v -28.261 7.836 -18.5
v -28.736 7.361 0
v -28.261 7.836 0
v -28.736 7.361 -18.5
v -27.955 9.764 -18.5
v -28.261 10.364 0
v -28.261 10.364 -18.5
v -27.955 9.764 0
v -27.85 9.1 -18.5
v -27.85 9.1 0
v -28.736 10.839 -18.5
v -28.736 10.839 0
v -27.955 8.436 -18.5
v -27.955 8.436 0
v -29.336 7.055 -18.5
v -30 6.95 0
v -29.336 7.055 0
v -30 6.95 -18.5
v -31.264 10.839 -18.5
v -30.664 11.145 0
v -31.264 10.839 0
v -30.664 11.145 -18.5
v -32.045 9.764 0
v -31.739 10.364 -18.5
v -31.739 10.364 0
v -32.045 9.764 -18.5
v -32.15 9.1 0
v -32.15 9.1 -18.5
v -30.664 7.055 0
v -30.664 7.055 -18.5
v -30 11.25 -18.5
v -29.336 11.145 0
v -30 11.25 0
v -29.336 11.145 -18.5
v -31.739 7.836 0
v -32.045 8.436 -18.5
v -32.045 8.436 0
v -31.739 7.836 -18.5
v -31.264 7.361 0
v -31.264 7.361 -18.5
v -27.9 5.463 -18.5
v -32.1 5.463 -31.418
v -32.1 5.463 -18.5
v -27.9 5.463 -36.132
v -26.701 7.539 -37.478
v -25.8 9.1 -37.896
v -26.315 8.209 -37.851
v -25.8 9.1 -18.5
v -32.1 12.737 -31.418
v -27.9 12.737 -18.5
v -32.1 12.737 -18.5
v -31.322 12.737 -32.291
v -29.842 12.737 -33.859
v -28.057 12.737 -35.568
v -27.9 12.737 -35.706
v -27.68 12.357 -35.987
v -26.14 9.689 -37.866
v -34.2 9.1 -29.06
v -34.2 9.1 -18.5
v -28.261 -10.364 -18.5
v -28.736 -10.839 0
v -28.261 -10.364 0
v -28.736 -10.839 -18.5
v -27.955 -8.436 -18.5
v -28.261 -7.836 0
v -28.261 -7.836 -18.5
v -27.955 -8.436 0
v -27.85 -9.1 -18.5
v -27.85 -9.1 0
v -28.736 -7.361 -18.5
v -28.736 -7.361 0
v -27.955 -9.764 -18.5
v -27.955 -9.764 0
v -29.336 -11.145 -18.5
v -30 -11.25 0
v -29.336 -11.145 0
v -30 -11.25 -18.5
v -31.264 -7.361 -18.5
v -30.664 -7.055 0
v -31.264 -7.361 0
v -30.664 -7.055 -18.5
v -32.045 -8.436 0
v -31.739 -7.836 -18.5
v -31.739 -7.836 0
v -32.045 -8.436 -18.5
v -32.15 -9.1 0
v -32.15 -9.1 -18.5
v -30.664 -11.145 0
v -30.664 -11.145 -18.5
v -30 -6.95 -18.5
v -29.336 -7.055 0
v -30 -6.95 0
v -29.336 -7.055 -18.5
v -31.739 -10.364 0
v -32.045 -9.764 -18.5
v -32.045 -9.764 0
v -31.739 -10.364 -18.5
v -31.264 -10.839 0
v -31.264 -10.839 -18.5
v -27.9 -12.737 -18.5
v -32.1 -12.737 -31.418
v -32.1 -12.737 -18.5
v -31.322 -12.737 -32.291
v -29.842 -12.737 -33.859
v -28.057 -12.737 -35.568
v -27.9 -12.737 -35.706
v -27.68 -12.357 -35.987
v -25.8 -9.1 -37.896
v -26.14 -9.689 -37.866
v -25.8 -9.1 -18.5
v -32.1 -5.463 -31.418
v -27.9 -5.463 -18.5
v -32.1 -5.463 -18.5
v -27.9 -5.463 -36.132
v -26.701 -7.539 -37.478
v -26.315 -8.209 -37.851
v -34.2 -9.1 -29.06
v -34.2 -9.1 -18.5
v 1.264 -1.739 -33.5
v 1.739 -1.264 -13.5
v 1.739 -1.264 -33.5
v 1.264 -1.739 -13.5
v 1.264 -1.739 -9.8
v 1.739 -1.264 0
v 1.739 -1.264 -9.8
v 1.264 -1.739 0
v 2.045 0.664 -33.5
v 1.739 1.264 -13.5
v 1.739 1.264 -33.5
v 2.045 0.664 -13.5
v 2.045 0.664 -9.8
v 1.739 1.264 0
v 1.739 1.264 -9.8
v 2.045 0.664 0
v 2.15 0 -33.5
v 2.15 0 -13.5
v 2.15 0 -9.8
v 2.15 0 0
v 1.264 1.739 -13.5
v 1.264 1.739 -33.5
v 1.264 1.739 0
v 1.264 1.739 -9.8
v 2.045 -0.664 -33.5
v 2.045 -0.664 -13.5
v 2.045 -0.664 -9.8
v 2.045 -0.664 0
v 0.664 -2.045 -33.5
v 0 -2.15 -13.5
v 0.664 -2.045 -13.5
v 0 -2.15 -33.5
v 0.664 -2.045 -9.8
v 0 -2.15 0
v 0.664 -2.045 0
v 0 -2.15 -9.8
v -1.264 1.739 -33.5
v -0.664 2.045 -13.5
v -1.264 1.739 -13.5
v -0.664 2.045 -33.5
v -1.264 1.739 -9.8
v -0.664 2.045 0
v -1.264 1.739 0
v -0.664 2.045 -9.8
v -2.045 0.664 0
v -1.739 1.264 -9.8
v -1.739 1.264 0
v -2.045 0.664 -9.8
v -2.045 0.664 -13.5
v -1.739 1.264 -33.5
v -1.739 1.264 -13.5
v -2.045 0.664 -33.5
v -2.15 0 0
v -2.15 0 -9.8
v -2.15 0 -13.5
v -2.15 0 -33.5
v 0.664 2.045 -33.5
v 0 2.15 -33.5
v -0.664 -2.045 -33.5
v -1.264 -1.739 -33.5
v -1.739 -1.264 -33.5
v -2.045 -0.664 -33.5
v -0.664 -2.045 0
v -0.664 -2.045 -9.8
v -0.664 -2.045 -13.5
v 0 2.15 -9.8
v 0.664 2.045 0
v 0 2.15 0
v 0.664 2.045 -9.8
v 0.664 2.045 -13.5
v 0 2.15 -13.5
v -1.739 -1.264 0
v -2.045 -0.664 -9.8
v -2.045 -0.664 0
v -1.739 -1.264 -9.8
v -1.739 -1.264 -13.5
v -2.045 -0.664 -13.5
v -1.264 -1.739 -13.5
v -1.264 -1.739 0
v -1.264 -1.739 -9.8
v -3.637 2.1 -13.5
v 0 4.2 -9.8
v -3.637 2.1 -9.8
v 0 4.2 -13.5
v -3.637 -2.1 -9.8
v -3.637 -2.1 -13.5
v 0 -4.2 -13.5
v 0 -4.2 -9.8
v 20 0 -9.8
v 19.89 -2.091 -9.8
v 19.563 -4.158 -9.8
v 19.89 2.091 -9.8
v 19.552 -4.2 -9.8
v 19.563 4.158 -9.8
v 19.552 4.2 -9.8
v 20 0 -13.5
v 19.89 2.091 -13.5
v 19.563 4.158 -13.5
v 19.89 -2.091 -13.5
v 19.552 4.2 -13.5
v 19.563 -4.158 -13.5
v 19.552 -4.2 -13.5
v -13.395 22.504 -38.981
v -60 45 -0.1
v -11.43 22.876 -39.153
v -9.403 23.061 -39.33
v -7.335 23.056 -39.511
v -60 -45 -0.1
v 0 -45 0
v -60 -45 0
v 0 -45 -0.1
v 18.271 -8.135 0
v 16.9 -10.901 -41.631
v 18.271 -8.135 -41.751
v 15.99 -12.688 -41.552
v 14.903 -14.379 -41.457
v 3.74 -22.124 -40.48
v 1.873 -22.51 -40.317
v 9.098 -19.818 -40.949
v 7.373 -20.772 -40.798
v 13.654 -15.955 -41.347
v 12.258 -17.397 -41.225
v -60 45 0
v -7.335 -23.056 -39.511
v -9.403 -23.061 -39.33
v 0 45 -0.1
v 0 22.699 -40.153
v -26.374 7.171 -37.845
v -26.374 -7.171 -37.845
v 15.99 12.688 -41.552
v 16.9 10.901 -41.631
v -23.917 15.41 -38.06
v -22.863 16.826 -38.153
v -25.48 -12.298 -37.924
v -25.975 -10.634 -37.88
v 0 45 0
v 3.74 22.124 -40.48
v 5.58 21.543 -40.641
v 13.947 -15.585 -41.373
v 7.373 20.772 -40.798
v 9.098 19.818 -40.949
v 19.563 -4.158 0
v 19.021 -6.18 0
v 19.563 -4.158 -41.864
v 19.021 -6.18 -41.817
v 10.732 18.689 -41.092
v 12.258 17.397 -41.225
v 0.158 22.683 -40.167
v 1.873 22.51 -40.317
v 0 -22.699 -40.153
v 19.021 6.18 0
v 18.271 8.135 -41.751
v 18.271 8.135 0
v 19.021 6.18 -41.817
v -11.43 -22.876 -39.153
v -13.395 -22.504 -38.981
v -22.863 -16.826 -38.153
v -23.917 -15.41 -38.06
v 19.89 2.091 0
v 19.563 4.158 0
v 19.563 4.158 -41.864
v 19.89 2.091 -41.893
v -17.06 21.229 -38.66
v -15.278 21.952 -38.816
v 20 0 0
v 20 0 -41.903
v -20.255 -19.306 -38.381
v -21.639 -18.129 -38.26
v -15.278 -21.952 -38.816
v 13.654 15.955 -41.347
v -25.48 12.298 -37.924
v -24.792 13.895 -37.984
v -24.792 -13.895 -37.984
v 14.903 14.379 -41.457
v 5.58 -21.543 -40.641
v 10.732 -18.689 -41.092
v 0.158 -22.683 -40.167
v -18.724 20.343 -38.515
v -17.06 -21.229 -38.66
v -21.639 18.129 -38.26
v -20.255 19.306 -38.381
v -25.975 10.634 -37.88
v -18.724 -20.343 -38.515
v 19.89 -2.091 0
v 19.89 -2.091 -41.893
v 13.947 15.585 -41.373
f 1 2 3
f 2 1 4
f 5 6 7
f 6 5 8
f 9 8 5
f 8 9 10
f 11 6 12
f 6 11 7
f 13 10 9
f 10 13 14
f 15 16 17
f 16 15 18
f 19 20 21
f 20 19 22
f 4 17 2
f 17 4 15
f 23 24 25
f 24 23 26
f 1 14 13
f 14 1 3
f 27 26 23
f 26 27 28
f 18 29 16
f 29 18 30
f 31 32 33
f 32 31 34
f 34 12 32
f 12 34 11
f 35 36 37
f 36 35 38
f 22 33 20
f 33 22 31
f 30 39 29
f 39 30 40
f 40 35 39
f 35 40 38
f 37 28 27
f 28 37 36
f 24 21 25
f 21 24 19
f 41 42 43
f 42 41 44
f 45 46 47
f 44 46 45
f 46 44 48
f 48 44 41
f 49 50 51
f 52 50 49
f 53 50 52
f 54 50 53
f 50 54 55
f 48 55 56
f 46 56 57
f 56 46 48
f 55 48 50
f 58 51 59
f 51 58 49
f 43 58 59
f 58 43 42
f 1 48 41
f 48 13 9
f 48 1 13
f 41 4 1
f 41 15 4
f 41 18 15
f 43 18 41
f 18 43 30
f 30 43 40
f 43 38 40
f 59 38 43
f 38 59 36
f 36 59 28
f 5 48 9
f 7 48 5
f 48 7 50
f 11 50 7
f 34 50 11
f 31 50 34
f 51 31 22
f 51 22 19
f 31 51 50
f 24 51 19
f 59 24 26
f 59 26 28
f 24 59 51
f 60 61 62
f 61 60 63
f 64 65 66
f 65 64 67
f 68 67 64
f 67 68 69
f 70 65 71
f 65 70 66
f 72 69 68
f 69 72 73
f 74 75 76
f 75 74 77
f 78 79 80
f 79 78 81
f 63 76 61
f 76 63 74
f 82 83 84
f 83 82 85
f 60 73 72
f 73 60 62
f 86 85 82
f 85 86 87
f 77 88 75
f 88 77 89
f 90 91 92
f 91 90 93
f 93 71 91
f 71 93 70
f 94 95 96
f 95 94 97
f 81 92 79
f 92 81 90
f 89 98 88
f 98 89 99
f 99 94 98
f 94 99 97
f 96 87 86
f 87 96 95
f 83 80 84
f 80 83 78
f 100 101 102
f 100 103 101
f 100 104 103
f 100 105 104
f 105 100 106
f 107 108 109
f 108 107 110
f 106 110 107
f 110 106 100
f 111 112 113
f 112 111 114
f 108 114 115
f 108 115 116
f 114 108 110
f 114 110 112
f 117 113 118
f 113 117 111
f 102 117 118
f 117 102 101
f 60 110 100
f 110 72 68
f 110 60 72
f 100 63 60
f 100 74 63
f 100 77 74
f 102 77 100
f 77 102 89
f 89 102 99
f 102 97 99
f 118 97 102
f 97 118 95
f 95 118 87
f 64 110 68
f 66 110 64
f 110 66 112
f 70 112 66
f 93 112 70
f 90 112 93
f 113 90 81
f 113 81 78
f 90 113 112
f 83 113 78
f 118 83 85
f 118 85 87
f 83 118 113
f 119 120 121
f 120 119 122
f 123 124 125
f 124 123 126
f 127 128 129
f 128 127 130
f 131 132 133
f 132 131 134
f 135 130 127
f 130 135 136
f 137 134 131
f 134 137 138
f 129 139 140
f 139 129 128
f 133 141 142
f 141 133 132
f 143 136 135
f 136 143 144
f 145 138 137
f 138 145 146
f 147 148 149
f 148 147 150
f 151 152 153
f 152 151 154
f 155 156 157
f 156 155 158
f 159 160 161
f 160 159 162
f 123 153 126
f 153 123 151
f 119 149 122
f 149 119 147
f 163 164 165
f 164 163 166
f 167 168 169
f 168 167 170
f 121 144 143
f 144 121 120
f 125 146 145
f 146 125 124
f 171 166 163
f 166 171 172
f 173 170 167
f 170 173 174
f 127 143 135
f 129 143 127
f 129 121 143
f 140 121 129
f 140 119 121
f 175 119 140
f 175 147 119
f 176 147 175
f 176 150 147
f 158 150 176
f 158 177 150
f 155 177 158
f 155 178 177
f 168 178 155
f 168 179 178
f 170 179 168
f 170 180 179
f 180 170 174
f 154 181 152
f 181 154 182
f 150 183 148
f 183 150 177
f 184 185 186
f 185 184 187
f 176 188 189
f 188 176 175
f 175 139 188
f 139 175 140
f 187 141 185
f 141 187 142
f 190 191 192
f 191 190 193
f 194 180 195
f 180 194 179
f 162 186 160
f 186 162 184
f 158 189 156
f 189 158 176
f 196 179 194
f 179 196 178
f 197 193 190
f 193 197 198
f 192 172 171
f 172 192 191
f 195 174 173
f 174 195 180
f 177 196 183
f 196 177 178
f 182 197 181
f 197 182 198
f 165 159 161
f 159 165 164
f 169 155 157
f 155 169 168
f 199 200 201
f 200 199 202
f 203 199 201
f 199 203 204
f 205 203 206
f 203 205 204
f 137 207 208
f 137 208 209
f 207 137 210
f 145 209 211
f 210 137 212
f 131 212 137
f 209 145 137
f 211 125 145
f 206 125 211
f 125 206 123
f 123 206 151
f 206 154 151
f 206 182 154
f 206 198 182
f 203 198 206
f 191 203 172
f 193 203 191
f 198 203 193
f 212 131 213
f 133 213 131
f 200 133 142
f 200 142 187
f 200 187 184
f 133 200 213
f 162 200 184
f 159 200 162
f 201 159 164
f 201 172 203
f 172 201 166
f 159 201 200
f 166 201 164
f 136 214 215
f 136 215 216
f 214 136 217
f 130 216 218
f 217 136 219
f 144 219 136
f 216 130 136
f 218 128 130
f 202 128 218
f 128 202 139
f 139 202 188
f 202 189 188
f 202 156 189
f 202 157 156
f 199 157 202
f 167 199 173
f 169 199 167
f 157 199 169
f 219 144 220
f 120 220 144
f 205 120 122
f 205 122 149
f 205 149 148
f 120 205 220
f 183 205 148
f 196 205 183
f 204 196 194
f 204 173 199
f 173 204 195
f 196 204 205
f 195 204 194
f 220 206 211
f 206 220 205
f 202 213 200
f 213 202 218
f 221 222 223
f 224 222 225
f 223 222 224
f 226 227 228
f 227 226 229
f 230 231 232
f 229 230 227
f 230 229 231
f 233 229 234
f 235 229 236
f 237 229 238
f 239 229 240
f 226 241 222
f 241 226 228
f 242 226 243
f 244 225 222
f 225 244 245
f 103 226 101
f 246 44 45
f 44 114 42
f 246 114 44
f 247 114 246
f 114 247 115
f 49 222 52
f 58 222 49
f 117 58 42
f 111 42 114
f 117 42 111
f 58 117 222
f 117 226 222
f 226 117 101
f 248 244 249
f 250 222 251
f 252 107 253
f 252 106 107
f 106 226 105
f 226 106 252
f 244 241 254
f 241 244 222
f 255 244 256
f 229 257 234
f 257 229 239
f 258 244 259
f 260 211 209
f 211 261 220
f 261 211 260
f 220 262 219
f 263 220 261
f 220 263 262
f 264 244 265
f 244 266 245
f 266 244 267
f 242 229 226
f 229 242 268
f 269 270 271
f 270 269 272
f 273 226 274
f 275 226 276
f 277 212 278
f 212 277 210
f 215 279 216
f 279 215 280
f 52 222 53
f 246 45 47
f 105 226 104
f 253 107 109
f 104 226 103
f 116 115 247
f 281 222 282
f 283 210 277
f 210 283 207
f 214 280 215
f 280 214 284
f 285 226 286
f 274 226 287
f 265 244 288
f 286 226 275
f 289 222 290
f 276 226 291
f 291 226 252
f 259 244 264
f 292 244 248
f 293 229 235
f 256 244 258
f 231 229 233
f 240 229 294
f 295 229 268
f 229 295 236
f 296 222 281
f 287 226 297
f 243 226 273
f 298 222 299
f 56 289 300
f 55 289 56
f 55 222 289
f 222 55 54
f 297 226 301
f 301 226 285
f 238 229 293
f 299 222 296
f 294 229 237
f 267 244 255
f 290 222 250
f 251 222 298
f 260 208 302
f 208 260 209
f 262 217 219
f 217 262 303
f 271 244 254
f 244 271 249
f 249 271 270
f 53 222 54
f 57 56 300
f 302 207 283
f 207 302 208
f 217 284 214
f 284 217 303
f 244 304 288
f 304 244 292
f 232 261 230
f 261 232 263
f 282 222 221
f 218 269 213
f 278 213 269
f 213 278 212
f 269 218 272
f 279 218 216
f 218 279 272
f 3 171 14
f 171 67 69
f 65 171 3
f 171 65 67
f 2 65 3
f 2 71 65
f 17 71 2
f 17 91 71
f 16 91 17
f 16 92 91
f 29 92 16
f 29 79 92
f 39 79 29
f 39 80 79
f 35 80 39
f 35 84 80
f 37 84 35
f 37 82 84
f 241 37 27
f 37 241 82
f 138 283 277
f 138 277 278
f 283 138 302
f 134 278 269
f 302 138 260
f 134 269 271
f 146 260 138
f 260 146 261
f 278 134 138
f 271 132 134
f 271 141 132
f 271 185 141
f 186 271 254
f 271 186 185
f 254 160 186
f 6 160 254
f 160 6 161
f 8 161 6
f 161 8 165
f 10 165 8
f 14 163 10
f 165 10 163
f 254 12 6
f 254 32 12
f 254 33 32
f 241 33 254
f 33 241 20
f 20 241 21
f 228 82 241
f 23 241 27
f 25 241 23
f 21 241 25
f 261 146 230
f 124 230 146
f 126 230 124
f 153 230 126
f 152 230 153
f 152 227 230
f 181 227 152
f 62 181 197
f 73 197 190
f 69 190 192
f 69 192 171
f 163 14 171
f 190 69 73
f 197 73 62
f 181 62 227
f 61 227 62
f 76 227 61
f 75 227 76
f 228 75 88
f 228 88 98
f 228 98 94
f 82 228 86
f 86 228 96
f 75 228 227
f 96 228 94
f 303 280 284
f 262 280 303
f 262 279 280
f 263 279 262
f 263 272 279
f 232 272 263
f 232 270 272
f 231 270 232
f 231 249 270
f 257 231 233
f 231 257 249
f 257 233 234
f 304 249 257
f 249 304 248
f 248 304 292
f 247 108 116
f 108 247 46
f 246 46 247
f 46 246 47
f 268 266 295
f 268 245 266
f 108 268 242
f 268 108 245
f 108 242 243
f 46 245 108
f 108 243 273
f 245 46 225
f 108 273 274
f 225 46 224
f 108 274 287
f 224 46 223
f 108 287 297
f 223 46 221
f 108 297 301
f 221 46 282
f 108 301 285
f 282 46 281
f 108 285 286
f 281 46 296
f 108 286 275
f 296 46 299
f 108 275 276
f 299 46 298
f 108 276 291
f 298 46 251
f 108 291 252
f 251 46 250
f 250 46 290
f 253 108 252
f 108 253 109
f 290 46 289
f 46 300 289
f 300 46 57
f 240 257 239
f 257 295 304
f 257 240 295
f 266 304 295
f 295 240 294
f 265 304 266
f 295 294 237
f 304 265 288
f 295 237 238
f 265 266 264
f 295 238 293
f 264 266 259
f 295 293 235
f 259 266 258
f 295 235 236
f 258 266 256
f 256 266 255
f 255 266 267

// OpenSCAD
// file: 888_1000.scad
/*
// Nastavení zobrazení
$vpr = [338, 0, 357];
$vpt = [180, 25, -18];
$vpd = 1280;
*/
//improving rendering speed.
draft = true;   // sets rendering quality to draft.
$fs = draft ? 5 : 0.5;
$fa = 10;

/*
TODO: 

Přední díl obsahuje převis ve směru vybrání pro držák motoru. (U horního zámku)
Otvory pro šrouby v předním dílu jsou oválné, protože nejsou kolmo k rovině modelu.


*/




//vnitřní kapka
module hollowing_skeleton(shell_thickness = hull_wall_thickness, draft)
{

    beta = 90 - trailing_edge_angle(naca = hull_airfoil_thickness); // calculate the angle of trailing edge
    trailing_wall= 1/(cos(beta)); //calculate lenght of wall cut relative to wall thickness 

    intersection () {
    resize([hull_drop_length - shell_thickness - trailing_wall* shell_thickness, (hull_drop_length*hull_airfoil_thickness/100) - 2*shell_thickness, (hull_drop_length*hull_airfoil_thickness/100) - 2*shell_thickness], auto=true)
            rotate ([0,90,0])           
            rotate_extrude($fn = draft ? 50 : 100)
                rotate([0,0,90])
                    difference()
                    {
                      polygon(points = airfoil_data(naca=hull_airfoil_thickness, L = hull_drop_length, N=draft ? 50 : 200)); 
                      square(hull_drop_length); 
                    }
                    
      translate([0,0,hull_corner_radius])
        minkowski(){                   
            translate ([0,- hull_y_size , - hull_z_size/2 + shell_thickness])
                cube ([hull_x_size,2*hull_y_size - shell_thickness, hull_z_size - 2*shell_thickness - 2*hull_corner_radius]);
                rotate ([0,90,0])
                    cylinder (h = 1, r = hull_corner_radius, $fn = draft ? 50 : 100);                   
          }
                            
    }
}

module hollowing_skeleton_hem(ribbon_width, draft)
{

    beta = 90 - trailing_edge_angle(naca = hull_airfoil_thickness); // calculate the angle of trailing edge
    trailing_wall= 1/(cos(beta)); //calculate lenght of wall cut relative to wall thickness 

    intersection () {
    resize([hull_drop_length - ribbon_width - trailing_wall* ribbon_width, (hull_drop_length*hull_airfoil_thickness/100) - 2*ribbon_width, (hull_drop_length*hull_airfoil_thickness/100) - 2*ribbon_width], auto=true)
            rotate ([0,90,0])           
            rotate_extrude($fn = draft ? 50 : 100)
                rotate([0,0,90])
                    difference()
                    {
                      polygon(points = airfoil_data(naca=hull_airfoil_thickness, L = hull_drop_length, N=draft ? 50 : 200)); 
                      square(hull_drop_length); 
                    }
                    
      translate([0,0,hull_corner_radius])
        minkowski(){                   
            translate ([0,- hull_y_size, - hull_z_size/2 + ribbon_width])
                cube ([hull_x_size,2*hull_y_size - ribbon_width, hull_z_size - 2*ribbon_width - 2*hull_corner_radius]);
                rotate ([0,90,0])
                    cylinder (h = 1, r = hull_corner_radius, $fn = draft ? 50 : 100);                   
          }
                            
    }
}




//celá kapka
module drop(draft = true)
{

    beta = 90 - trailing_edge_angle(naca = hull_airfoil_thickness); // calculate the angle of trailing edge
    trailing_wall= 1/(cos(beta)); //calculate lenght of wall cut relative to wall thickness 

	intersection () {
    	rotate ([0,90,0])           
        	rotate_extrude($fn = draft ? 50 : 100)
                    rotate([0,0,90])
                        difference()
                        {
	                        polygon(points = airfoil_data(naca=hull_airfoil_thickness, L =hull_drop_length , N=draft ? 50 : 200)); 
    	                    square(hull_drop_length); 
        	            }
            		
        translate([0,0,hull_corner_radius])
          	minkowski(){                   
             	translate ([0,-hull_y_size,-hull_z_size/2])
             			cube ([hull_x_size, 2*hull_y_size,hull_z_size-2*hull_corner_radius]);
             	  	rotate ([0,90,0])
                 		cylinder (h = 1, r = hull_corner_radius, $fn = draft ? 50 : 100);                   
		    }
		    
	}
}


//základní kapka
module drop_skin(draft){

	difference(){
			drop();
		translate([hull_wall_thickness,0,0])
			hollowing_skeleton();
	}

}




drop_skin();














use <./lib/naca4.scad>
include <../Parameters.scad>
// file: ../Parameters.scad
//Main tube diameter - hole [mm]
main_tube_outer_diameter = 25.4;
main_tube_inner_diameter = 23.5;

//Tube for undercarriage - hole [mm]
tube_for_undercarriage_outer_diameter = 10.6;
tube_for_undercarriage_inner_diameter = 6;
global_clearance = 0.5;


//umístění podvozkových trubek

second_undercarriage_hole = main_tube_outer_diameter*2 + main_tube_outer_diameter/5 + main_tube_outer_diameter/2 + 170 + 160;

// Parameters of cube couplings
coupling_wall_thickness = main_tube_outer_diameter/5;  //width of coupling walls 
thickness_between_tubes = main_tube_outer_diameter/10;    // minimum distance between tubes in couplings

coupling_wall_thickness_undercarriage = tube_for_undercarriage_outer_diameter/3;
thickness_between_tubes_undercarriage = tube_for_undercarriage_outer_diameter/10;

//Screw diameter and nut for M4 [mm]
M4_screw_diameter=4.5;
Nut_height_M4 = 3.2;
Nut_diameter_M4 = 7.86;


//Screw diameter and nut for M3 [mm]
M3_screw_diameter = 3.2;
Nut_height_M3 = 1.7;	
Nut_diameter_M3 = 6.6; 


//The tube for help
Help_main_tube_outer = 25;
Help_main_tube_inner = 23; 
Help_tube_for_undercarriage_outer = 10;
Help_tube_for_undercarriage_inner = 5;


//main hull parameters

hull_drop_length = 580;
hull_wall_thickness = 0.8;
hull_y_size = 120;
hull_z_size = 150;
hull_x_size = 580;
hull_corner_radius = 4;
hull_airfoil_thickness= 35;  // thickness of drop generating airfoil in percent of lenght.
hull_scale_x = 1;
hull_scale_y = 1.5;
hull_scale_z = 1.5;

main_pilon_position = 170+68;
cover_pilon_position = 180;
height_of_vertical_tube = 275; //278mm je změřená délka trubky. 

ribbon_width = 5; // šířka vyztužovacích lemů. 

// šířka otvoru v přední části kapoty pro držák motoru.
width_of_engine_holder = 63;

//Top Cover Division - dělení horního krytu pro tisk
top_cover_division = [0, 50, 150, 280, 410, hull_x_size]; // upraveny seznam tak, aby deleni začinalo od nuly, což umožňí úplně automatické rozdělení.

//Bottom Cover Division - dělení dolního krytu pro tisk
bottom_cover_division = [0,100,250,365, 470, hull_x_size];
// zkrácená část pro payload pro testovací tisk
//bottom_cover_division = [0,200,250,365, 470, hull_x_size];

//Base Divison - dělení podložky
base_division = [0,140,280,410, hull_x_size];

//Cover pilon division - na výšku (v ose Z)
cover_pilon_division = [0,170,height_of_vertical_tube + main_tube_outer_diameter + coupling_wall_thickness];

//pozice šroubů
	//horní kryt
top_screw_position = [0, (top_cover_division[0] + top_cover_division[1])/4, (top_cover_division[2] - top_cover_division[1])/2 + top_cover_division[1], (top_cover_division[3] - top_cover_division[2])/2 + top_cover_division[2],(top_cover_division[4] - top_cover_division[3])/2 + top_cover_division[3],(top_cover_division[5] - top_cover_division[4])/2 + top_cover_division[4] - 20];
	//spodní kryt
bottom_screw_position = [0,(bottom_cover_division[0] + bottom_cover_division[1])/15 + 5, bottom_cover_division[1]/1.1, + bottom_cover_division[3], bottom_cover_division[3] + bottom_cover_division[1]/2, bottom_cover_division[4] - 6*global_clearance, bottom_cover_division[4] + bottom_cover_division[1]/2.5];




//šířka zámků
lock_width = 10;

//délka zámků
lock_length = 3;


//accumulator
//základní rozměry akumulátoru
width_of_accumulator = 129.4;//45+1;
depth_of_accumulator = 40.61;
height_of_accumulator = 43.65;
//Zapuštění akumulátoru
sink_of_accumulator = 5; //main_tube_outer_diameter/5 - Nut_height_M3*1.5;

//tloušťka hrany spojky
accumulator_holder_width = 18; 
accumulator_holder_thickness = 10; 

//posunutí akumálátoru na podložce
move_of_accumulator = 165;   // pozice akumulátoru (ovlivňuje těžiště)


////////////////
// Senzory
///////////////////

//opticalFlow
    width_optical_flow_senzor = 45.5;
    depth_optical_flow_senzor = 6;
    height_optical_flow_senzor = 35;
    sink_of_optical_flow_senzor = depth_optical_flow_senzor - 5; 
    M3_optical_flow_senzor_Z = 30.4;
    M3_optical_flow_senzor_X = 24;
    M3_optical_flow_senzor_Z_alone = 9.1;
    M3_optical_flow_senzor_X_alone = 16.7;
// file: lib/naca4.scad
// Naca4.scad - library for parametric airfoils of 4 digit NACA series
// Code: Rudolf Huttary, Berlin 
// June 2015
// commercial use prohibited


// general use: for more examples refer to sampler.scad
// naca = naca digits or 3el vector  (default = 12 or [0, 0, .12])
// L    = chord length [mm]      (default= 100)
// N    = # sample points        (default= 81)
// h    = height [mm]            (default= 1)
// open = close at the thin end? (default = true)
// two equivalent example calls
 airfoil(naca = 2408, L = 60, N=1001, h = 30, open = false); 
// airfoil(naca = [.2, .4, .32], L = 60, N=1001, h = 30, open = false); 

module help()
{
  echo(str("\n\nList of signatures in lib:\n=================\n", 
  "module airfoil(naca=2412, L = 100, N = 81, h = 1, open = false) - renders airfoil object\n", 
  "module airfoil(naca=[.2, .4, .12], L = 100, N = 81, h = 1, open = false) - renders airfoil object using percentage for camber,  camber distance and thicknes\n", 
  "function airfoil_data(naca=12, L = 100, N = 81, open = false)\n",
  "=================\n")); 
}

help(); 
// this is the object
module airfoil(naca=12, L = 100, N = 81, h = 1, open = false)
{
  linear_extrude(height = h)
  polygon(points = airfoil_data(naca, L, N, open)); 
}

module hollow_airfoil(lnaca=12, L = 100, N = 81, h = 1, open = false, wall_thickness = 1)
{
    if (open){
        linear_extrude(height = h)

        if (wall_thickness>0){
            difference(){
                polygon(points = airfoil_data(naca, L, N, false));
                offset(delta = - wall_thickness, chamfer = false) polygon(points = airfoil_data(naca, L, N, open = false));
            }
        }
        else{
            difference(){
                offset(delta = - wall_thickness, chamfer = false) polygon(points = airfoil_data(naca, L, N, open = false));
                polygon(points = airfoil_data(naca, L, N, false));
            }
        }
    }
    else{

        linear_extrude(height = abs(wall_thickness))
            polygon(points = airfoil_data(naca, L, N, false)); 

        linear_extrude(height = h)
            difference(){
                polygon(points = airfoil_data(naca, L, N, open));
                offset(delta = - wall_thickness) polygon(points = airfoil_data(naca, L, N, open = false));
            }

        translate([0,0, h - wall_thickness])
            linear_extrude(height = abs(wall_thickness))
                polygon(points = airfoil_data(naca, L, N, false)); 

    }
}


// this is the main function providing the airfoil data
function airfoil_data(naca=12, L = 100, N = 81, open = false) = 
  let(Na = len(naca)!=3?NACA(naca):naca)
  let(A = [.2969, -0.126, -.3516, .2843, open?-0.1015:-0.1036])
  [for (b=[-180:360/(N):179.99]) 
    let (x = (1-cos(b))/2)  
    let(yt = sign(b)*Na[2]/.2*(A*[sqrt(x), x, x*x, x*x*x, x*x*x*x])) 
    Na[0]==0?L*[x, yt]:L*camber(x, yt, Na[0], Na[1], sign(b))];  


function trailing_edge_angle(naca=12, open = false) = 
  let(Na = len(naca)!=3?NACA(naca):naca)
  let(A = [.2969, -0.126, -.3516, .2843, open?-0.1015:-0.1036])
  let (x =0.999)  // set x near to airfoil trailing edge
  let(yt = Na[2]/.2*(A*[sqrt(x), x, x*x, x*x*x, x*x*x*x])) // calculate distance from x-axis at previously set position
  atan2(yt,1-x);  // calculate angle of triangle between end of airfoil. The triange height corresponds to previously calculated distance from x-axis

function surface_angle(x = 0.5, naca=12, open = false) = 
  let(Na = len(naca)!=3?NACA(naca):naca)
  let(A = [0.2969, -0.126, -0.3516, 0.2843, open?-0.1015:-0.1036])
  let(dy = Na[2]/0.2*(A*[(1/2)*(1/sqrt(x)), 1, 2*x, 3*x*x, 4*x*x*x])) // calculate derivative of airfoil function at the x point
  atan(dy);  // calculate  the angle from function derivative

function surface_distance(x = 0.5, naca=12, open = false) = 
  let(Na = len(naca)!=3?NACA(naca):naca)
  let(A = [0.2969, -0.126, -0.3516, 0.2843, open?-0.1015:-0.1036])
  Na[2]/.2*(A*[sqrt(x), x, x*x, x*x*x, x*x*x*x]); // calculate distance from x-axis at previously set position

// helper functions
function NACA(naca) = 
  let (M = floor(naca/1000))
  let (P = floor((naca-M*1000)/100)) 
  [M/100, P/10, floor(naca-M*1000-P*100)/100];  

function camber(x, y, M, P, upper) = 
  let(yc = (x<P)?M/P/P*(2*P*x-x*x): M/(1-P)/(1-P)*(1 - 2*P + 2*P*x -x*x))
  let(dy = (x<P)?2*M/P/P*(P-x):2*M/(1-P)/(1-P)*(P-x))
  let(th = atan(dy))
  [upper ? x - y*sin(th):x + y*sin(th), upper ? yc + y*cos(th):yc - y*cos(th)];
// main file
/*============= Dil pro pripevneni predniho kolecka k nosniku =============== */

include <../parameters.scad>
use <888_1004.scad>

column_upper_diameter = 40;
column_lower_diameter = 40;
column_height = 40;

joint_diameter = 40;
screw_length = 10.8;
height = 25;
washer_diameter = 20;
screw_distance = 42.5;
stops_overhang = 3;
layer_height = 0.2;

module 888_2009(){
    difference(){

        //sloupek
        hull(){

            translate([-engine_holder_beam_depth-10, -(beam_width+10)/2, -0.1])
                cube([engine_holder_beam_depth+10, beam_width+10, 0.1]);

            translate([0, 0, -column_height-5])
                cylinder (h=column_height+5, d=column_lower_diameter, $fn=60);
        }

        rotate([0, 5, 0])
            translate([0, 0, -column_lower_diameter-50])
                cylinder(d=column_lower_diameter+30, h=50, $fn=30);


        translate([-engine_holder_beam_depth + beam_patern/2, (beam_main_pipe_distance/2-beam_main_pipe_thickness-3), -beam_thickness/2]){
            translate([0, 0, -30])
                cylinder(d = M4_screw_diameter, h = 50, $fn = 20);
            translate([0, 0, -5-100])
                cylinder(d = M4_nut_diameter, h = 100, $fn = 6);

        }

        translate( [-engine_holder_beam_depth + beam_patern/2, -(beam_main_pipe_distance/2-beam_main_pipe_thickness-3), -beam_thickness/2]){
            translate([0, 0, -30])
                cylinder(d = M4_screw_diameter, h = 50, $fn = 20);
            translate([0, 0, -5-100])
                cylinder(d = M4_nut_diameter, h = 100, $fn = 6);
        }

        translate([-engine_holder_beam_depth + beam_patern*1.25, 0, -beam_thickness/2]){
            translate([0, 0, -20])
                cylinder(d = M4_screw_diameter, h = 50, $fn = 20);
            translate([0, 0, 0])
                rotate(30)
                    cylinder(d = M4_nut_diameter, h = M4_nut_height, $fn = 6);
            rotate(-90)
                translate([-M4_nut_diameter/2, 0, 0])
                    cube([M4_nut_diameter, 50, M4_nut_height]);
        }


        //dira pro hlavni M5 osou
        translate([0, 0, -1-column_height])
            cylinder(h=column_height-80, d=M5_screw_diameter, $fn=50);

        //kapsa pro M5 matici
        rotate([0, 0, 90])
            translate([0, -M5_nut_pocket/2, column_height*1.5])
                hull() {
                    translate([0,M5_nut_pocket/2,0]) cylinder(h=M5_nut_height, d=M5_nut_diameter, $fn=6);
                    cube ([column_upper_diameter/2, M5_nut_pocket, M5_nut_height ]);
                }

                    #translate([0, 0, -80]) difference() {
                        union() {
                            translate([0, 0, -5])
                            cylinder(d=joint_diameter, h=height+5, $fn=100);

                            hull() {
                                translate([0, 0, height/2])
                                    cylinder(d=joint_diameter, h=height/2, $fn=100);

                                translate([0, 0, height-5])
                                    cylinder(d=screw_distance+10, h=5, $fn=100);
                            }

                            //zarážka
                            hull() {
                                translate([stop_width/2, 0, -stops_overhang])
                                    rotate([0, 0, max_angle_of_ratation/-2])
                                        translate([0, joint_diameter/2-10, 0])
                                            cube([8, stop_size+10, 10]);

                                translate([stop_width/2, 0, -stops_overhang+10])
                                    rotate([0, 0, max_angle_of_ratation/-2])
                                        translate([0, joint_diameter/2-10, 0])
                                            cube([8, stop_size, 10]);
                            }
                            //zarážka
                            hull() {
                                translate([stop_width/-2, 0, -stops_overhang])
                                    rotate([0, 0, max_angle_of_ratation/2])
                                        translate([-8, joint_diameter/2-10, 0])
                                            cube([8, stop_size+10, 10]);

                                translate([stop_width/-2, 0, -stops_overhang+10])
                                    rotate([0, 0, max_angle_of_ratation/2])
                                        translate([-8, joint_diameter/2-10, 0])
                                            cube([8, stop_size, 10]);
                            }
                        }
                        rotate([5, 0, 0])
                        translate([0, 0, -10])
                            cylinder(d=joint_diameter+1, h=10, $fn=50);

                        //šroub uchycení podvozku
                        rotate([5, 0, 0]) {
                            translate([0, 0, -0.1])
                                cylinder(d=M8_screw_diameter, h=screw_length-layer_height, $fn=20);
                            translate([0, 0, screw_length])
                                cylinder(d=washer_diameter, h=100, $fn=40);
                        }

                        //šrouby pro připevnění k motorovému dílu
                        translate([screw_distance/2, 0, 0])
                            cylinder(d=M4_screw_diameter, h=100, $fn=20);

                        translate([screw_distance/-2, 0, 0])
                            cylinder(d=M4_screw_diameter, h=100, $fn=20);

                        translate([screw_distance/2, 0, -10])
                            cylinder(d=M4_screw_diameter+5, h=height+5, $fn=20);

                        translate([screw_distance/-2, 0, -10])
                            cylinder(d=M4_screw_diameter+5, h=height+5, $fn=20);
                    }

    }
}

888_2009();
